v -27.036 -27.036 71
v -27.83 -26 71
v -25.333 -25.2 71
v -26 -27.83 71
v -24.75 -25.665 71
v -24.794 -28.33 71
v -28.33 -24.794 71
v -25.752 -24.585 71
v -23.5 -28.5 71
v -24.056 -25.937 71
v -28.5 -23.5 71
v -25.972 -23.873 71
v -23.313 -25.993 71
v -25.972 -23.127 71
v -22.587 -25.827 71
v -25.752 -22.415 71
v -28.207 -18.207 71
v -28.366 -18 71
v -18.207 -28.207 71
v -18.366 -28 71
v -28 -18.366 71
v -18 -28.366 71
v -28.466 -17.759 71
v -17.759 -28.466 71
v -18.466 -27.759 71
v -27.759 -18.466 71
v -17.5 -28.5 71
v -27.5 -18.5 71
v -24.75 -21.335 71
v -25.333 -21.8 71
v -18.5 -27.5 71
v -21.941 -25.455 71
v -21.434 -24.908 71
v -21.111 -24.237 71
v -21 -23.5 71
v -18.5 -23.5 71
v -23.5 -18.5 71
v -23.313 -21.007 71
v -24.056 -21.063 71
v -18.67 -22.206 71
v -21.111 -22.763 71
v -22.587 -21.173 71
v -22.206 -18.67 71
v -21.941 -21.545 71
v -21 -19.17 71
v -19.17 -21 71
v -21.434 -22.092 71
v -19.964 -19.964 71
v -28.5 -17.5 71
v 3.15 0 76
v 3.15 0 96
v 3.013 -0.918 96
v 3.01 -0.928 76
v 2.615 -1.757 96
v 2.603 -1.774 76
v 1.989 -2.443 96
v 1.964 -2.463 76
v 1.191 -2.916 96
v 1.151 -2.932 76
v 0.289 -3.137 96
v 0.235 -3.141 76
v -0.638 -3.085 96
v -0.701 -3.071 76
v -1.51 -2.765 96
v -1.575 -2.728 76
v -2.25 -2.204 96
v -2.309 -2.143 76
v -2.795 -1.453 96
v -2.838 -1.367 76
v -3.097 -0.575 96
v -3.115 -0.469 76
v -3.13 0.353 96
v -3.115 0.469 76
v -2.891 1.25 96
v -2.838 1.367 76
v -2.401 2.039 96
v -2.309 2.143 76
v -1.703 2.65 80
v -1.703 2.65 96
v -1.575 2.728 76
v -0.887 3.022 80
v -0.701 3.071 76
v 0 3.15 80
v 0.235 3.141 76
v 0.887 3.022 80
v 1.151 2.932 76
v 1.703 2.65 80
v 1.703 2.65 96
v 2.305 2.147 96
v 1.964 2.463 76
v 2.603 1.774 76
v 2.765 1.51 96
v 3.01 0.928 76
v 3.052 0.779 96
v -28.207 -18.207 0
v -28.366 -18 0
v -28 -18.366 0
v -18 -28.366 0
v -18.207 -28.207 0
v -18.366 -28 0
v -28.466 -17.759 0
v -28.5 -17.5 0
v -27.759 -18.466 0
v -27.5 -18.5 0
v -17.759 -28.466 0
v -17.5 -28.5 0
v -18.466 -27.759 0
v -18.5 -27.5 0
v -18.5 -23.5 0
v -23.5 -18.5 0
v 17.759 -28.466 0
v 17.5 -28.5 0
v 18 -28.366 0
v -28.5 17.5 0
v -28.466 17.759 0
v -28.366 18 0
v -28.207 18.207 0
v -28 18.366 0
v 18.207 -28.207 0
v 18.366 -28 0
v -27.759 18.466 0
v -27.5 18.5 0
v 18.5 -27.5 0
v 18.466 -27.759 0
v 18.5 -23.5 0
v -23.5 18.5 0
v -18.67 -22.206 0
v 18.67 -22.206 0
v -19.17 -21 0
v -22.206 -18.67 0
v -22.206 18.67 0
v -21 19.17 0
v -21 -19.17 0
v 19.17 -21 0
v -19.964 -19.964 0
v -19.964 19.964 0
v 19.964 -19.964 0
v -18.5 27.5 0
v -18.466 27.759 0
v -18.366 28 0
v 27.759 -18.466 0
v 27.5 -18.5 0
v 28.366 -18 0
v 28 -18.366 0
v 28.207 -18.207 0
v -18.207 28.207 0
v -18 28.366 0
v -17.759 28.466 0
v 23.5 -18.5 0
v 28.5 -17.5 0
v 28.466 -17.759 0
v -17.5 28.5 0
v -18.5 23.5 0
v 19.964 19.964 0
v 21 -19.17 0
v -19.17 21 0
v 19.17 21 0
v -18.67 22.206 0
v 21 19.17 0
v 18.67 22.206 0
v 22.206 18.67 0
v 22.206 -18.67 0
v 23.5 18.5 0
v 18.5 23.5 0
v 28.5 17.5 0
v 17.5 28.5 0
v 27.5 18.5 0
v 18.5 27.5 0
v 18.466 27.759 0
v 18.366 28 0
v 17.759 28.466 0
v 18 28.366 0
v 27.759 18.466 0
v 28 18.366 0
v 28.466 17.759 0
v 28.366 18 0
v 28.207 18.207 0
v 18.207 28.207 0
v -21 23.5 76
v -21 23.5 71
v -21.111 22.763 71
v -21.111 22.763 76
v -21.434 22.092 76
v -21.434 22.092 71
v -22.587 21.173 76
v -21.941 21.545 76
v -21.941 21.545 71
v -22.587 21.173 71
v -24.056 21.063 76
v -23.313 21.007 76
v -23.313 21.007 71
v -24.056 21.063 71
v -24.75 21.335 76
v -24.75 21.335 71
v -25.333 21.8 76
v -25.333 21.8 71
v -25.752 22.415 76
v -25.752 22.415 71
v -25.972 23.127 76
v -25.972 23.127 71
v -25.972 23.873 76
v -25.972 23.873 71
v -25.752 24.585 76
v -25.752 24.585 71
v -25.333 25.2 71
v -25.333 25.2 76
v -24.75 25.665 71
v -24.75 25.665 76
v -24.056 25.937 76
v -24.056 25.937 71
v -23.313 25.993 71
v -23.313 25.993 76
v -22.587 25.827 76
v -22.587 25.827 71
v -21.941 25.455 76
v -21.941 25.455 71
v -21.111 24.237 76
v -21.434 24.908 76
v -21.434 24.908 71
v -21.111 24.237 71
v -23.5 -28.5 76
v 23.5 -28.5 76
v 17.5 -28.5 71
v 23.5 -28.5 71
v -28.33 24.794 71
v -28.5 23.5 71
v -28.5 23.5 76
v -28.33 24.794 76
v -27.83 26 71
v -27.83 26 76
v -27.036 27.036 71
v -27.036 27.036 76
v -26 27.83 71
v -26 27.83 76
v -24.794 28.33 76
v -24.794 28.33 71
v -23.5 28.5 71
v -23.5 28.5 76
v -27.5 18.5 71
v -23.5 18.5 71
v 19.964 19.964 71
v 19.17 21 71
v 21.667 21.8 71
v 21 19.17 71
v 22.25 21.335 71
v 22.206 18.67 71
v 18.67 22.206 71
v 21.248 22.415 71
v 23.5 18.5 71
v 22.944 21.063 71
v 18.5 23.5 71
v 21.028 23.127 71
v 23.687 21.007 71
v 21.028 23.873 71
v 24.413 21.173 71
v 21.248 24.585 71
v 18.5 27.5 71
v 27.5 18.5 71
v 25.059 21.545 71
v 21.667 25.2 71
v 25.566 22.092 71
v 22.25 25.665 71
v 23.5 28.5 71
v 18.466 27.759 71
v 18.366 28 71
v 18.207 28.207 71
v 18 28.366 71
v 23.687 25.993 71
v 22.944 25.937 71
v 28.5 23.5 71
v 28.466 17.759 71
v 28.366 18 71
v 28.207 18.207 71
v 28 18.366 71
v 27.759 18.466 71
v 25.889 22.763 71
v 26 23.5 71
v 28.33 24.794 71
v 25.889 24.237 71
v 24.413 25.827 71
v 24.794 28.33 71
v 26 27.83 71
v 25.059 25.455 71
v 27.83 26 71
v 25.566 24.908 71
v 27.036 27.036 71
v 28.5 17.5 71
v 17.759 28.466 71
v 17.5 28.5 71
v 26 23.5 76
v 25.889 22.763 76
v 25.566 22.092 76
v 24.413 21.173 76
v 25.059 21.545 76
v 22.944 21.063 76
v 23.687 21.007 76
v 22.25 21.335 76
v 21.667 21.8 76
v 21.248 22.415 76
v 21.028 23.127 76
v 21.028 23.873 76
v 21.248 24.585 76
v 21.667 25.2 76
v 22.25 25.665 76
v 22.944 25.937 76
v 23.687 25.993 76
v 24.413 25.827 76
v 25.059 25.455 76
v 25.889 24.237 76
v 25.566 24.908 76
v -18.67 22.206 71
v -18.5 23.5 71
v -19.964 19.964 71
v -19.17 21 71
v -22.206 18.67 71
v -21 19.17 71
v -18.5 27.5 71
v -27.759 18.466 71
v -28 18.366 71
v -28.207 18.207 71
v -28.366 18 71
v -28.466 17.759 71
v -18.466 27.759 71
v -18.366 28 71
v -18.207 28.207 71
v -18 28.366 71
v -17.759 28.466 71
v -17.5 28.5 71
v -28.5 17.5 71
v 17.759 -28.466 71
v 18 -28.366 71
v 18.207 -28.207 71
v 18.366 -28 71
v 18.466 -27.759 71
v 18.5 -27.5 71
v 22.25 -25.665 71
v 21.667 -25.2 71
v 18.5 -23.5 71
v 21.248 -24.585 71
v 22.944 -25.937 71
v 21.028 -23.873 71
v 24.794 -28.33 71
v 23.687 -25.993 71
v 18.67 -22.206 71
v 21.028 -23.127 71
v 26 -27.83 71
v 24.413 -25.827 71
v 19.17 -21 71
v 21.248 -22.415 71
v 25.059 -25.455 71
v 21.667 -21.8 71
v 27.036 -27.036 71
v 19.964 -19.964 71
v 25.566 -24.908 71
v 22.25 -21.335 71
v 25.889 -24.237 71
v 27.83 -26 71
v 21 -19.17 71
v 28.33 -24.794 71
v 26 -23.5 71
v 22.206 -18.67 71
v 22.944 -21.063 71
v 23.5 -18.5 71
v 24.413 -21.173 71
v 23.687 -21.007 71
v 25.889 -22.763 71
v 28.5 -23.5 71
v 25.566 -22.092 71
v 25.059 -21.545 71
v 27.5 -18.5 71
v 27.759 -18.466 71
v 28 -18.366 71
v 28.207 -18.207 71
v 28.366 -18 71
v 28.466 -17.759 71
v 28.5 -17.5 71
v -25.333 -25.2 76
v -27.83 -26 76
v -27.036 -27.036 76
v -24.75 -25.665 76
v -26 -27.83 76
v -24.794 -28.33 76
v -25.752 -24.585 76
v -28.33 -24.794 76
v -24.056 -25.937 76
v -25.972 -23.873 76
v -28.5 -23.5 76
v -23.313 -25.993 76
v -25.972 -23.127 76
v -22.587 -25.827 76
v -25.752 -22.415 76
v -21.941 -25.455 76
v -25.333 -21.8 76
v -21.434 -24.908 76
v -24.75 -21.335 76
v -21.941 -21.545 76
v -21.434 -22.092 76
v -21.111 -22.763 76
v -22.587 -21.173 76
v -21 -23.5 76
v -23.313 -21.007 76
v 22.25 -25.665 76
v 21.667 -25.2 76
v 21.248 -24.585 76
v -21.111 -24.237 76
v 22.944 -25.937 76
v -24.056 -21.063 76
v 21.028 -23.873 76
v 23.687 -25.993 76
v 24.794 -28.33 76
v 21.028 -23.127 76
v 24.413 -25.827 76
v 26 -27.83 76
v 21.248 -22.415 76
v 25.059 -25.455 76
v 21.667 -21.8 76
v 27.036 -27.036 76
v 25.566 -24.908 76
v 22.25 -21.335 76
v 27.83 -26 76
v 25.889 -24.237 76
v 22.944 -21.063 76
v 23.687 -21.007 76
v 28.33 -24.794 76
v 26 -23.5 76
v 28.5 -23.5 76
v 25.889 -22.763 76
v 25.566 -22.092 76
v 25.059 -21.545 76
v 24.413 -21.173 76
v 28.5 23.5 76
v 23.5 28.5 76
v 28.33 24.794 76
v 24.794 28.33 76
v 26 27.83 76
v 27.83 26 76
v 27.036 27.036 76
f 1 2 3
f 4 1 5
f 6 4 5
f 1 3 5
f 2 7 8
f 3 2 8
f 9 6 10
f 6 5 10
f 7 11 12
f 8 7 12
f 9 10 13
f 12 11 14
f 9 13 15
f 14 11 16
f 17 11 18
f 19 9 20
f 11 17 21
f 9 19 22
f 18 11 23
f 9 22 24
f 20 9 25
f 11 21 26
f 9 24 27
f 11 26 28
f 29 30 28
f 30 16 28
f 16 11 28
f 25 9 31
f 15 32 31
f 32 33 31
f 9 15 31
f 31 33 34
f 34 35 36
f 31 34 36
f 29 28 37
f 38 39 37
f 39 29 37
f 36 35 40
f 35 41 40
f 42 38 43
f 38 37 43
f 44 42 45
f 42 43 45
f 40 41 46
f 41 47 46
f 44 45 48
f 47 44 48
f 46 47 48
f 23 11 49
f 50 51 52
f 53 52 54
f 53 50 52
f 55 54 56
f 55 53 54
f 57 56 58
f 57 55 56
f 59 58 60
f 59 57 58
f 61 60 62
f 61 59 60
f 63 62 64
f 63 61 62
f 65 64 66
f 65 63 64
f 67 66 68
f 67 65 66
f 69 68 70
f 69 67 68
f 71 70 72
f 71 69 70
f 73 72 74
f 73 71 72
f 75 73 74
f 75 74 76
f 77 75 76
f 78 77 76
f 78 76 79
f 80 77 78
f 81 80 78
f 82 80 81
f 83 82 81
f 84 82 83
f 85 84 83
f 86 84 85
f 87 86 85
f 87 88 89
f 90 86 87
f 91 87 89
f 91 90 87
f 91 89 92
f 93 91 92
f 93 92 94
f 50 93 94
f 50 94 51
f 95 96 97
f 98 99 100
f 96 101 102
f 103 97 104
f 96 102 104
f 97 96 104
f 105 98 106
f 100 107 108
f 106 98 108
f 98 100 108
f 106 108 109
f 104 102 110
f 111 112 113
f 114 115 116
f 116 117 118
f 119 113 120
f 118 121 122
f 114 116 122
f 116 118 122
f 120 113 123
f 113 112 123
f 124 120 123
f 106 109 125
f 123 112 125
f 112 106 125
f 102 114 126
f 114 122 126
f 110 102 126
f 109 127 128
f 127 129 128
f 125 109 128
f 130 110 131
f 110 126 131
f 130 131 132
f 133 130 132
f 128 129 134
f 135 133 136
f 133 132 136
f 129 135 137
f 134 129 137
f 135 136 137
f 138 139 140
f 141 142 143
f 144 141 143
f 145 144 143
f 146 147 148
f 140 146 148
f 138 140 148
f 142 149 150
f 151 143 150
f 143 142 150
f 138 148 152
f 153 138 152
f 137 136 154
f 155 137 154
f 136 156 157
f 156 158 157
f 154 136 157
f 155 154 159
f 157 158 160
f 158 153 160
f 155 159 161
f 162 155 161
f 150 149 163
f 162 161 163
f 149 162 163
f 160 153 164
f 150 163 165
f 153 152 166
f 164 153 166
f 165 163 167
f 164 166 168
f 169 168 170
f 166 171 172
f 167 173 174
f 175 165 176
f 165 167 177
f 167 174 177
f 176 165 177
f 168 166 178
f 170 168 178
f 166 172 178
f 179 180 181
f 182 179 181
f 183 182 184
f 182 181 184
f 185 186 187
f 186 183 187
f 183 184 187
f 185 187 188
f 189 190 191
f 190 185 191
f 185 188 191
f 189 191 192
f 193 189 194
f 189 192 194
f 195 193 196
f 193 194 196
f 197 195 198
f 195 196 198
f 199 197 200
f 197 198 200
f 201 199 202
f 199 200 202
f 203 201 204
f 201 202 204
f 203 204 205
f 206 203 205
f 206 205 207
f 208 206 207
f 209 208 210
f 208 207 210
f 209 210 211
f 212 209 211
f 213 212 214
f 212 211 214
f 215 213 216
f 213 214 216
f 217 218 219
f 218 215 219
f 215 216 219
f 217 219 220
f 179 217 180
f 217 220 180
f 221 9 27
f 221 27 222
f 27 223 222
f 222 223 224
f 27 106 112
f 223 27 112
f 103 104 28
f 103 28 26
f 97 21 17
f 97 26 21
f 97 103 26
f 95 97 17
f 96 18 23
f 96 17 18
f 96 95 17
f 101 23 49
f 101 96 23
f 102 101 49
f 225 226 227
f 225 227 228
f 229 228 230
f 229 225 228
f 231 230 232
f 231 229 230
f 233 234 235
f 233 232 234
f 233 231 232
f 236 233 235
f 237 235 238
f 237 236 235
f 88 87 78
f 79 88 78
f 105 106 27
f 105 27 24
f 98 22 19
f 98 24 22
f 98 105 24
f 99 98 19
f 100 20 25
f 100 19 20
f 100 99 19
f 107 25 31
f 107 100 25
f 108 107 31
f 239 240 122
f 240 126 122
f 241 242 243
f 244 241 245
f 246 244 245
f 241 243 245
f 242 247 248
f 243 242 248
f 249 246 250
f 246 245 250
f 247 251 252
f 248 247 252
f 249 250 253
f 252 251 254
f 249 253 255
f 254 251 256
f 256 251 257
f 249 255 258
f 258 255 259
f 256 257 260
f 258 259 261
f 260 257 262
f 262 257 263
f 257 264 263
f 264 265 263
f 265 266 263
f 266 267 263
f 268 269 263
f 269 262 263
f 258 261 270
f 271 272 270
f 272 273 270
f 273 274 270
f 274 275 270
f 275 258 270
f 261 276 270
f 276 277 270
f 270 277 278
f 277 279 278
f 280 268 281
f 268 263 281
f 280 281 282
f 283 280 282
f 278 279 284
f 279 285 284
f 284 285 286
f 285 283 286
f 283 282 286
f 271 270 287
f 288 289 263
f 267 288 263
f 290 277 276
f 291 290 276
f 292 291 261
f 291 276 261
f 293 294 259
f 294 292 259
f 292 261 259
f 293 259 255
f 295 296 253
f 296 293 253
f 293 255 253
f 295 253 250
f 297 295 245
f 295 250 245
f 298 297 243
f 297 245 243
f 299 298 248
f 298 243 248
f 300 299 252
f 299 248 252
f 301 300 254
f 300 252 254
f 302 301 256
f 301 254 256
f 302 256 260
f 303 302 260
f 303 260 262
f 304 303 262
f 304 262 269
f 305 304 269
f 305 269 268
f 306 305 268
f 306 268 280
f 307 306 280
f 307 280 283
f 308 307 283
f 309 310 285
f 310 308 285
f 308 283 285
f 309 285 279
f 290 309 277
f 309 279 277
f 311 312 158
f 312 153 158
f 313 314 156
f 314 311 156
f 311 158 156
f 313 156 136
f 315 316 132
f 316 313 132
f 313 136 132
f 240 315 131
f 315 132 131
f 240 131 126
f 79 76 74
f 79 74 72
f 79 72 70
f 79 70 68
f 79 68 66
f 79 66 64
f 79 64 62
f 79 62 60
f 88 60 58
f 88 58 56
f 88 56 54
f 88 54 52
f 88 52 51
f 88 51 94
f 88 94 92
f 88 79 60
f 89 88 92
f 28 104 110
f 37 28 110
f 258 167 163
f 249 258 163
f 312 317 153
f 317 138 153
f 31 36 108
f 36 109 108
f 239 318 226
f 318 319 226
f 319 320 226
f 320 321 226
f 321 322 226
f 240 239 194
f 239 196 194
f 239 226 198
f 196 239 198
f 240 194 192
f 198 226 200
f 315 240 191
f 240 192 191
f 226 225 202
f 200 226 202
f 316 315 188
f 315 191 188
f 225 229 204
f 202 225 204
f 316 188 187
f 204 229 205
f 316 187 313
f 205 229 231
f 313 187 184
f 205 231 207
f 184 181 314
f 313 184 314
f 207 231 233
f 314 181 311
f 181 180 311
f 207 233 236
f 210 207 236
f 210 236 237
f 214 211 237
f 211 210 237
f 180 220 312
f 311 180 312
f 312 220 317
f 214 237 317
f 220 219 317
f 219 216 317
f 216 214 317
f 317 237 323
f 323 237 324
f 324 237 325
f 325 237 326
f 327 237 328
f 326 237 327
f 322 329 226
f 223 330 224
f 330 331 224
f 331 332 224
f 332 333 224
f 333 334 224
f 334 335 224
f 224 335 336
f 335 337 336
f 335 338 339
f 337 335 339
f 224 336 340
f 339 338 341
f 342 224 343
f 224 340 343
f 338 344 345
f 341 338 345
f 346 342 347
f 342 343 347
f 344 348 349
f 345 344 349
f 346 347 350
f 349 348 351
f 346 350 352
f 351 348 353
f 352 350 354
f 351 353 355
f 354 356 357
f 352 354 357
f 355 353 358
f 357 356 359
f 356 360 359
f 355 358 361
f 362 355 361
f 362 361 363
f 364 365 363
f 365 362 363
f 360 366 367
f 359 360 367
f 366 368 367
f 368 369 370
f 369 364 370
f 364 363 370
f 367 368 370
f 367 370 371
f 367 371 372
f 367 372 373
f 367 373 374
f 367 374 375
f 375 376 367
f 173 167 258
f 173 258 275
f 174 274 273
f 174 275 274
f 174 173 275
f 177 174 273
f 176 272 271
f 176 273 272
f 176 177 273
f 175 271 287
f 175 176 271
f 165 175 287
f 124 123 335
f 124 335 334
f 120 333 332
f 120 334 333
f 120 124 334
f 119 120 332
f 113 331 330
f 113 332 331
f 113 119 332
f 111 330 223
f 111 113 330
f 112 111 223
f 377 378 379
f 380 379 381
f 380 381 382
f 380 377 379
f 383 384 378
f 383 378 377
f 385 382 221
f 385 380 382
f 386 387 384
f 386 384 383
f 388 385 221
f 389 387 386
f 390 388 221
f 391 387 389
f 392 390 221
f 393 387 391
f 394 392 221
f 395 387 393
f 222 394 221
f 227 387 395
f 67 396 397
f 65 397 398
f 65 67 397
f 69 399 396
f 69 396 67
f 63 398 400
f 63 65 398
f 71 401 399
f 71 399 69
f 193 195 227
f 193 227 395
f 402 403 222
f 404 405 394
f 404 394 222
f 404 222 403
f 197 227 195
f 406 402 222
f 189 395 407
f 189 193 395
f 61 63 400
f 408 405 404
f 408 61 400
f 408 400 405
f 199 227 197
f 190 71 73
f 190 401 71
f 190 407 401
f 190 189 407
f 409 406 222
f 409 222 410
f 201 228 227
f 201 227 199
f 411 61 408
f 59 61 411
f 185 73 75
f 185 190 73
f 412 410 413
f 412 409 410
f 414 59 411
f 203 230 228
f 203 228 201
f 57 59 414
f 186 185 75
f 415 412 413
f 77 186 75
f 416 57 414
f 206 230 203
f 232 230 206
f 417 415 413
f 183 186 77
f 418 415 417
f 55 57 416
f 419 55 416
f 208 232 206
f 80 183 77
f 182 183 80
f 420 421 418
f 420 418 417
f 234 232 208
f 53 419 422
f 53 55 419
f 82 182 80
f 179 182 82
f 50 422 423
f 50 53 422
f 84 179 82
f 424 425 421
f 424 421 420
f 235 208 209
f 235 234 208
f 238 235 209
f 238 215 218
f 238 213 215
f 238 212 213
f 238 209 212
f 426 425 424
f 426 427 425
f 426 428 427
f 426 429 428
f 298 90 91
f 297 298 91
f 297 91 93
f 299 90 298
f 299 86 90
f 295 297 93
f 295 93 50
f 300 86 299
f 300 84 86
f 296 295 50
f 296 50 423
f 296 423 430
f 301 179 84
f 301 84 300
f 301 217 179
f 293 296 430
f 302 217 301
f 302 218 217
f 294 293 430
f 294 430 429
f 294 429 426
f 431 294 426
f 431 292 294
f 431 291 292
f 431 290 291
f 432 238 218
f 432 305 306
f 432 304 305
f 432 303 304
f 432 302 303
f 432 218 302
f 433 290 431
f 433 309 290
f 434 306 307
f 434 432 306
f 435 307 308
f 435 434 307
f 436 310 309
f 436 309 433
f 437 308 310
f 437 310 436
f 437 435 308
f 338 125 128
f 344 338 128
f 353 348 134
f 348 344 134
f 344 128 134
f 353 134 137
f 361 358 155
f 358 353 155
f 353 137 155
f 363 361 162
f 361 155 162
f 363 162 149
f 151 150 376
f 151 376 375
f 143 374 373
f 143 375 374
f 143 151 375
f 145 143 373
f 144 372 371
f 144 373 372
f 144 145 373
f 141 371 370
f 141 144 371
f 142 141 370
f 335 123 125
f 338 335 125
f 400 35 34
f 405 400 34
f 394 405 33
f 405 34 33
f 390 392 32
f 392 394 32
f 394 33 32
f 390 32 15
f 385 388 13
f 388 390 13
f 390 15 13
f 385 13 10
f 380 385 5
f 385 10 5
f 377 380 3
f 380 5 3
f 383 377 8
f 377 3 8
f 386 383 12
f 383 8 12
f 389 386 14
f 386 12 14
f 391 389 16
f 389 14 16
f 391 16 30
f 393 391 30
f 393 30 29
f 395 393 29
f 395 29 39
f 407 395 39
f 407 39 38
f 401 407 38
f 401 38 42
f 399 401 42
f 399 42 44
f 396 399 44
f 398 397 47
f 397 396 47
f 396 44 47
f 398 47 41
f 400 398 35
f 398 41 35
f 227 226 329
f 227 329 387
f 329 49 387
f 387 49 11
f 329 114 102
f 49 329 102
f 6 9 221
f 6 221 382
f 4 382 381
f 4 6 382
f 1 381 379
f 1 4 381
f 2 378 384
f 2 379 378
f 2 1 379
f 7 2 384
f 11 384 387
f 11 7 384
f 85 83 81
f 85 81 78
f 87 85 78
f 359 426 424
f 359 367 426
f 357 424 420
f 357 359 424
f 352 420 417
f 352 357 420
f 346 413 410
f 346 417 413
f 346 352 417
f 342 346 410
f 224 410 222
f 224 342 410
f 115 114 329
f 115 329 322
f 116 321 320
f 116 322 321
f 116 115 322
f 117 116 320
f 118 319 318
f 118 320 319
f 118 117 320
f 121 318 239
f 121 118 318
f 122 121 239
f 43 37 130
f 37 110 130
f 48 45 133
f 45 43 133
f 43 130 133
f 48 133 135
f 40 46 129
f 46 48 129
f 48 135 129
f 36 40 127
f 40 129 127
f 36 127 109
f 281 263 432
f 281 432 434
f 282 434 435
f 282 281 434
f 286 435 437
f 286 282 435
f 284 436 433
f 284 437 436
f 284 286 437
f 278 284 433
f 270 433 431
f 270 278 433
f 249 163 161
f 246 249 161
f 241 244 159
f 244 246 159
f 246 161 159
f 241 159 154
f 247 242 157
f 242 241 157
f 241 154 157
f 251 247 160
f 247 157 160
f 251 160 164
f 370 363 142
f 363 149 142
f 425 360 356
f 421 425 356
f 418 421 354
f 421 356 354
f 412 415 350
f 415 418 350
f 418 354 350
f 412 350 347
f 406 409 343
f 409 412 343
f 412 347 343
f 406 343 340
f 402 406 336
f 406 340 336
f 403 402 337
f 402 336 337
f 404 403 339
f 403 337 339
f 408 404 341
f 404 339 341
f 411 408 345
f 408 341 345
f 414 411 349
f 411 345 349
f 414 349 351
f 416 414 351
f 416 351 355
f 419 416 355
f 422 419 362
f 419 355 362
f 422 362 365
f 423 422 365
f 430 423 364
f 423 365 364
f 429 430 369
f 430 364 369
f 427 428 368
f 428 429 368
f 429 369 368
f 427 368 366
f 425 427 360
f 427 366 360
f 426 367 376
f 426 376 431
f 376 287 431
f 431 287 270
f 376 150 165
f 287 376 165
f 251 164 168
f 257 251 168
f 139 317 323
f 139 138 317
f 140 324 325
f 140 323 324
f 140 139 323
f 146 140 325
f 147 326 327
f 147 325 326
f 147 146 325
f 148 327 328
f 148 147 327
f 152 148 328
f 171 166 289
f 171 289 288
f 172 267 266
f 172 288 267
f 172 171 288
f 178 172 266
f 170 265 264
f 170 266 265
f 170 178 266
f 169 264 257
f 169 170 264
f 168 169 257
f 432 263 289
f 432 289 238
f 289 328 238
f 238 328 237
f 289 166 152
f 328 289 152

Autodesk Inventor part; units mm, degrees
ref_plane "YZ Plane" through (0, 0, 0) normal (1, 0, 0) x (0, 1, 0)
ref_plane "XZ Plane" through (0, 0, 0) normal (0, 1, 0) x (-1, 0, 0)
ref_plane "XY Plane" through (0, 0, 0) normal (0, 0, 1) x (1, 0, 0)
sketch "Sketch1" plane through (0, 0, 0) normal (0, 0, 1) x (1, 0, 0)
  line L0 (17.5, 28.5) -> (-17.5, 28.5)
  line L1 (-28.5, 17.5) -> (-28.5, -17.5)
  line L2 (28.5, -17.5) -> (28.5, 17.5)
  arc A0 (-18.5, -23.5) -> (-23.5, -18.5) centre (-23.5, -23.5) ccw
  arc A1 (23.5, -18.5) -> (18.5, -23.5) centre (23.5, -23.5) ccw
  arc A2 (18.5, 23.5) -> (23.5, 18.5) centre (23.5, 23.5) ccw
  arc A3 (-23.5, 18.5) -> (-18.5, 23.5) centre (-23.5, 23.5) ccw
  line L3 (-23.5, 18.5) -> (-27.5, 18.5)
  line L4 (-18.5, 23.5) -> (-18.5, 27.5)
  line L5 (-23.5, -18.5) -> (-27.5, -18.5)
  line L6 (-18.5, -23.5) -> (-18.5, -27.5)
  line L7 (18.5, -23.5) -> (18.5, -27.5)
  line L8 (23.5, -18.5) -> (27.5, -18.5)
  line L9 (18.5, 23.5) -> (18.5, 27.5)
  line L10 (23.5, 18.5) -> (27.5, 18.5)
  line L11 (-17.5, -28.5) -> (17.5, -28.5)
  arc A4 (-28.5, -17.5) -> (-27.5, -18.5) centre (-27.5, -17.5) ccw
  arc A5 (17.5, -28.5) -> (18.5, -27.5) centre (17.5, -27.5) ccw
  arc A6 (-27.5, 18.5) -> (-28.5, 17.5) centre (-27.5, 17.5) ccw
  arc A7 (-17.5, 28.5) -> (-18.5, 27.5) centre (-17.5, 27.5) ccw
  arc A8 (-18.5, -27.5) -> (-17.5, -28.5) centre (-17.5, -27.5) ccw
  arc A9 (28.5, 17.5) -> (27.5, 18.5) centre (27.5, 17.5) ccw
  arc A10 (18.5, 27.5) -> (17.5, 28.5) centre (17.5, 27.5) ccw
  arc A11 (27.5, -18.5) -> (28.5, -17.5) centre (27.5, -17.5) ccw
  point P0 (0, 0)
  point P1 (18.5, 28.5)
  point P2 (-18.5, -28.5)
  point P3 (28.5, -18.5)
  point P4 (28.5, 18.5)
  dimension "d2" = 28.5
  dimension "d3" = 28.5
  dimension "d4" = 10
  dimension "d5" = 10
  dimension "d6" = 10
  dimension "d7" = 10
  dimension "d8" = 57
  dimension "d9" = 57
  dimension "d10" = 1
extrude "Extrusion1" add sketch "Sketch1" along normal blind 15
sketch "Sketch2" plane through (0, 0, 15) normal (0, 0, 1) x (1, 0, 0)
  line L0 (17.5, 28.5) -> (-17.5, 28.5) projected
  arc A0 (-23.5, 18.5) -> (-18.5, 23.5) centre (-23.5, 23.5) ccw projected
  arc A1 (-23.5, 18.5) -> (-18.5, 23.5) centre (-23.5, 23.5) ccw projected
  line L1 (-23.5, 18.5) -> (-27.5, 18.5) projected
  arc A2 (-27.5, 18.5) -> (-28.5, 17.5) centre (-27.5, 17.5) ccw projected
  line L2 (-28.5, 17.5) -> (-28.5, -17.5) projected
  arc A3 (-28.5, -17.5) -> (-27.5, -18.5) centre (-27.5, -17.5) ccw projected
  line L3 (-27.5, -18.5) -> (-23.5, -18.5) projected
  arc A4 (-18.5, -23.5) -> (-23.5, -18.5) centre (-23.5, -23.5) ccw projected
  line L4 (-18.5, -23.5) -> (-18.5, -27.5) projected
  arc A5 (-18.5, -27.5) -> (-17.5, -28.5) centre (-17.5, -27.5) ccw projected
  line L5 (-17.5, -28.5) -> (17.5, -28.5) projected
  arc A6 (17.5, -28.5) -> (18.5, -27.5) centre (17.5, -27.5) ccw projected
  line L6 (18.5, -27.5) -> (18.5, -23.5) projected
  arc A7 (23.5, -18.5) -> (18.5, -23.5) centre (23.5, -23.5) ccw projected
  line L7 (23.5, -18.5) -> (27.5, -18.5) projected
  arc A8 (27.5, -18.5) -> (28.5, -17.5) centre (27.5, -17.5) ccw projected
  line L8 (28.5, -17.5) -> (28.5, 17.5) projected
  arc A9 (28.5, 17.5) -> (27.5, 18.5) centre (27.5, 17.5) ccw projected
  line L9 (27.5, 18.5) -> (23.5, 18.5) projected
  arc A10 (18.5, 23.5) -> (23.5, 18.5) centre (23.5, 23.5) ccw projected
  line L10 (18.5, 23.5) -> (18.5, 27.5) projected
  arc A11 (18.5, 27.5) -> (17.5, 28.5) centre (17.5, 27.5) ccw projected
  line L11 (17.5, 28.5) -> (-17.5, 28.5) projected
  arc A12 (-17.5, 28.5) -> (-18.5, 27.5) centre (-17.5, 27.5) ccw projected
  line L12 (-18.5, 27.5) -> (-18.5, 23.5) projected
  point P0 (0, 0)
extrude "Extrusion2" add sketch "Sketch2" along normal blind 46
sketch "Sketch3" plane through (0, 0, 61) normal (0, 0, 1) x (1, 0, 0)
  arc A0 (-23.5, 18.5) -> (-18.5, 23.5) centre (-23.5, 23.5) ccw projected
  line L0 (-23.5, 18.5) -> (-27.5, 18.5) projected
  arc A1 (-27.5, 18.5) -> (-28.5, 17.5) centre (-27.5, 17.5) ccw projected
  line L1 (-28.5, 17.5) -> (-28.5, -17.5) projected
  arc A2 (-28.5, -17.5) -> (-27.5, -18.5) centre (-27.5, -17.5) ccw projected
  line L2 (-27.5, -18.5) -> (-23.5, -18.5) projected
  arc A3 (-18.5, -23.5) -> (-23.5, -18.5) centre (-23.5, -23.5) ccw projected
  line L3 (-18.5, -23.5) -> (-18.5, -27.5) projected
  arc A4 (-18.5, -27.5) -> (-17.5, -28.5) centre (-17.5, -27.5) ccw projected
  line L4 (-17.5, -28.5) -> (17.5, -28.5) projected
  arc A5 (17.5, -28.5) -> (18.5, -27.5) centre (17.5, -27.5) ccw projected
  line L5 (18.5, -27.5) -> (18.5, -23.5) projected
  arc A6 (23.5, -18.5) -> (18.5, -23.5) centre (23.5, -23.5) ccw projected
  line L6 (23.5, -18.5) -> (27.5, -18.5) projected
  arc A7 (27.5, -18.5) -> (28.5, -17.5) centre (27.5, -17.5) ccw projected
  line L7 (28.5, -17.5) -> (28.5, 17.5) projected
  arc A8 (28.5, 17.5) -> (27.5, 18.5) centre (27.5, 17.5) ccw projected
  line L8 (27.5, 18.5) -> (23.5, 18.5) projected
  arc A9 (18.5, 23.5) -> (23.5, 18.5) centre (23.5, 23.5) ccw projected
  line L9 (18.5, 23.5) -> (18.5, 27.5) projected
  arc A10 (18.5, 27.5) -> (17.5, 28.5) centre (17.5, 27.5) ccw projected
  line L10 (17.5, 28.5) -> (-17.5, 28.5) projected
  arc A11 (-17.5, 28.5) -> (-18.5, 27.5) centre (-17.5, 27.5) ccw projected
  line L11 (-18.5, 27.5) -> (-18.5, 23.5) projected
  point P0 (0, 0)
extrude "Extrusion3" add sketch "Sketch3" along normal blind 10
sketch "Sketch4" plane through (0, 0, 71) normal (0, 0, 1) x (1, 0, 0)
  line L0 (-23.5, -28.5) -> (23.5, -28.5)
  line L1 (28.5, -23.5) -> (28.5, 23.5)
  line L2 (23.5, 28.5) -> (-23.5, 28.5)
  line L3 (-28.5, 23.5) -> (-28.5, -23.5)
  line L4 (-27.0355, -27.0355) -> (28.5, 28.5) construction
  line L5 (28.5, -28.5) -> (-28.5, 28.5) construction
  arc A0 (-23.5, 28.5) -> (-28.5, 23.5) centre (-23.5, 23.5) ccw
  arc A1 (28.5, 23.5) -> (23.5, 28.5) centre (23.5, 23.5) ccw
  arc A2 (23.5, -28.5) -> (28.5, -23.5) centre (23.5, -23.5) ccw
  arc A3 (-28.5, -23.5) -> (-23.5, -28.5) centre (-23.5, -23.5) ccw
  line L6 (17.5, 28.5) -> (-17.5, 28.5) projected
  circle A4 centre (-23.5, 23.5) radius 2.5
  circle A5 centre (23.5, 23.5) radius 2.5
  circle A6 centre (23.5, -23.5) radius 2.5
  circle A7 centre (-23.5, -23.5) radius 2.5
  point P0 (0, 0)
  dimension "d17" = 57
  dimension "d18" = 10
  dimension "d19" = 10
  dimension "d20" = 10
  dimension "d21" = 10
  dimension "d22" = 28.5
  dimension "d23" = 5
  dimension "d24" = 5
  dimension "d25" = 5
  dimension "d26" = 5
extrude "Extrusion4" add sketch "Sketch4" along normal blind 5
sketch "Sketch5" plane through (0, 0, 76) normal (0, 0, 1) x (1, 0, 0)
  circle A0 centre (0, 0) radius 3.15
  dimension "d29" = 6.3
extrude "Extrusion5" add sketch "Sketch5" along normal blind 20
sketch "Sketch6" plane through (0, 0, 96) normal (0, 0, 1) x (1, 0, 0)
  arc A0 (1.7029, 2.65) -> (-1.7029, 2.65) centre (0, 0) ccw
  line L0 (1.7029, 2.65) -> (-1.7029, 2.65)
  circle A1 centre (0, 0) radius 3.15 projected
  arc A2 (1.7029, 2.65) -> (-1.7029, 2.65) centre (0, 0) ccw
extrude "Extrusion6" cut sketch "Sketch6" against normal blind 16 contours L0 A0
properties part number "Stepper motor"
